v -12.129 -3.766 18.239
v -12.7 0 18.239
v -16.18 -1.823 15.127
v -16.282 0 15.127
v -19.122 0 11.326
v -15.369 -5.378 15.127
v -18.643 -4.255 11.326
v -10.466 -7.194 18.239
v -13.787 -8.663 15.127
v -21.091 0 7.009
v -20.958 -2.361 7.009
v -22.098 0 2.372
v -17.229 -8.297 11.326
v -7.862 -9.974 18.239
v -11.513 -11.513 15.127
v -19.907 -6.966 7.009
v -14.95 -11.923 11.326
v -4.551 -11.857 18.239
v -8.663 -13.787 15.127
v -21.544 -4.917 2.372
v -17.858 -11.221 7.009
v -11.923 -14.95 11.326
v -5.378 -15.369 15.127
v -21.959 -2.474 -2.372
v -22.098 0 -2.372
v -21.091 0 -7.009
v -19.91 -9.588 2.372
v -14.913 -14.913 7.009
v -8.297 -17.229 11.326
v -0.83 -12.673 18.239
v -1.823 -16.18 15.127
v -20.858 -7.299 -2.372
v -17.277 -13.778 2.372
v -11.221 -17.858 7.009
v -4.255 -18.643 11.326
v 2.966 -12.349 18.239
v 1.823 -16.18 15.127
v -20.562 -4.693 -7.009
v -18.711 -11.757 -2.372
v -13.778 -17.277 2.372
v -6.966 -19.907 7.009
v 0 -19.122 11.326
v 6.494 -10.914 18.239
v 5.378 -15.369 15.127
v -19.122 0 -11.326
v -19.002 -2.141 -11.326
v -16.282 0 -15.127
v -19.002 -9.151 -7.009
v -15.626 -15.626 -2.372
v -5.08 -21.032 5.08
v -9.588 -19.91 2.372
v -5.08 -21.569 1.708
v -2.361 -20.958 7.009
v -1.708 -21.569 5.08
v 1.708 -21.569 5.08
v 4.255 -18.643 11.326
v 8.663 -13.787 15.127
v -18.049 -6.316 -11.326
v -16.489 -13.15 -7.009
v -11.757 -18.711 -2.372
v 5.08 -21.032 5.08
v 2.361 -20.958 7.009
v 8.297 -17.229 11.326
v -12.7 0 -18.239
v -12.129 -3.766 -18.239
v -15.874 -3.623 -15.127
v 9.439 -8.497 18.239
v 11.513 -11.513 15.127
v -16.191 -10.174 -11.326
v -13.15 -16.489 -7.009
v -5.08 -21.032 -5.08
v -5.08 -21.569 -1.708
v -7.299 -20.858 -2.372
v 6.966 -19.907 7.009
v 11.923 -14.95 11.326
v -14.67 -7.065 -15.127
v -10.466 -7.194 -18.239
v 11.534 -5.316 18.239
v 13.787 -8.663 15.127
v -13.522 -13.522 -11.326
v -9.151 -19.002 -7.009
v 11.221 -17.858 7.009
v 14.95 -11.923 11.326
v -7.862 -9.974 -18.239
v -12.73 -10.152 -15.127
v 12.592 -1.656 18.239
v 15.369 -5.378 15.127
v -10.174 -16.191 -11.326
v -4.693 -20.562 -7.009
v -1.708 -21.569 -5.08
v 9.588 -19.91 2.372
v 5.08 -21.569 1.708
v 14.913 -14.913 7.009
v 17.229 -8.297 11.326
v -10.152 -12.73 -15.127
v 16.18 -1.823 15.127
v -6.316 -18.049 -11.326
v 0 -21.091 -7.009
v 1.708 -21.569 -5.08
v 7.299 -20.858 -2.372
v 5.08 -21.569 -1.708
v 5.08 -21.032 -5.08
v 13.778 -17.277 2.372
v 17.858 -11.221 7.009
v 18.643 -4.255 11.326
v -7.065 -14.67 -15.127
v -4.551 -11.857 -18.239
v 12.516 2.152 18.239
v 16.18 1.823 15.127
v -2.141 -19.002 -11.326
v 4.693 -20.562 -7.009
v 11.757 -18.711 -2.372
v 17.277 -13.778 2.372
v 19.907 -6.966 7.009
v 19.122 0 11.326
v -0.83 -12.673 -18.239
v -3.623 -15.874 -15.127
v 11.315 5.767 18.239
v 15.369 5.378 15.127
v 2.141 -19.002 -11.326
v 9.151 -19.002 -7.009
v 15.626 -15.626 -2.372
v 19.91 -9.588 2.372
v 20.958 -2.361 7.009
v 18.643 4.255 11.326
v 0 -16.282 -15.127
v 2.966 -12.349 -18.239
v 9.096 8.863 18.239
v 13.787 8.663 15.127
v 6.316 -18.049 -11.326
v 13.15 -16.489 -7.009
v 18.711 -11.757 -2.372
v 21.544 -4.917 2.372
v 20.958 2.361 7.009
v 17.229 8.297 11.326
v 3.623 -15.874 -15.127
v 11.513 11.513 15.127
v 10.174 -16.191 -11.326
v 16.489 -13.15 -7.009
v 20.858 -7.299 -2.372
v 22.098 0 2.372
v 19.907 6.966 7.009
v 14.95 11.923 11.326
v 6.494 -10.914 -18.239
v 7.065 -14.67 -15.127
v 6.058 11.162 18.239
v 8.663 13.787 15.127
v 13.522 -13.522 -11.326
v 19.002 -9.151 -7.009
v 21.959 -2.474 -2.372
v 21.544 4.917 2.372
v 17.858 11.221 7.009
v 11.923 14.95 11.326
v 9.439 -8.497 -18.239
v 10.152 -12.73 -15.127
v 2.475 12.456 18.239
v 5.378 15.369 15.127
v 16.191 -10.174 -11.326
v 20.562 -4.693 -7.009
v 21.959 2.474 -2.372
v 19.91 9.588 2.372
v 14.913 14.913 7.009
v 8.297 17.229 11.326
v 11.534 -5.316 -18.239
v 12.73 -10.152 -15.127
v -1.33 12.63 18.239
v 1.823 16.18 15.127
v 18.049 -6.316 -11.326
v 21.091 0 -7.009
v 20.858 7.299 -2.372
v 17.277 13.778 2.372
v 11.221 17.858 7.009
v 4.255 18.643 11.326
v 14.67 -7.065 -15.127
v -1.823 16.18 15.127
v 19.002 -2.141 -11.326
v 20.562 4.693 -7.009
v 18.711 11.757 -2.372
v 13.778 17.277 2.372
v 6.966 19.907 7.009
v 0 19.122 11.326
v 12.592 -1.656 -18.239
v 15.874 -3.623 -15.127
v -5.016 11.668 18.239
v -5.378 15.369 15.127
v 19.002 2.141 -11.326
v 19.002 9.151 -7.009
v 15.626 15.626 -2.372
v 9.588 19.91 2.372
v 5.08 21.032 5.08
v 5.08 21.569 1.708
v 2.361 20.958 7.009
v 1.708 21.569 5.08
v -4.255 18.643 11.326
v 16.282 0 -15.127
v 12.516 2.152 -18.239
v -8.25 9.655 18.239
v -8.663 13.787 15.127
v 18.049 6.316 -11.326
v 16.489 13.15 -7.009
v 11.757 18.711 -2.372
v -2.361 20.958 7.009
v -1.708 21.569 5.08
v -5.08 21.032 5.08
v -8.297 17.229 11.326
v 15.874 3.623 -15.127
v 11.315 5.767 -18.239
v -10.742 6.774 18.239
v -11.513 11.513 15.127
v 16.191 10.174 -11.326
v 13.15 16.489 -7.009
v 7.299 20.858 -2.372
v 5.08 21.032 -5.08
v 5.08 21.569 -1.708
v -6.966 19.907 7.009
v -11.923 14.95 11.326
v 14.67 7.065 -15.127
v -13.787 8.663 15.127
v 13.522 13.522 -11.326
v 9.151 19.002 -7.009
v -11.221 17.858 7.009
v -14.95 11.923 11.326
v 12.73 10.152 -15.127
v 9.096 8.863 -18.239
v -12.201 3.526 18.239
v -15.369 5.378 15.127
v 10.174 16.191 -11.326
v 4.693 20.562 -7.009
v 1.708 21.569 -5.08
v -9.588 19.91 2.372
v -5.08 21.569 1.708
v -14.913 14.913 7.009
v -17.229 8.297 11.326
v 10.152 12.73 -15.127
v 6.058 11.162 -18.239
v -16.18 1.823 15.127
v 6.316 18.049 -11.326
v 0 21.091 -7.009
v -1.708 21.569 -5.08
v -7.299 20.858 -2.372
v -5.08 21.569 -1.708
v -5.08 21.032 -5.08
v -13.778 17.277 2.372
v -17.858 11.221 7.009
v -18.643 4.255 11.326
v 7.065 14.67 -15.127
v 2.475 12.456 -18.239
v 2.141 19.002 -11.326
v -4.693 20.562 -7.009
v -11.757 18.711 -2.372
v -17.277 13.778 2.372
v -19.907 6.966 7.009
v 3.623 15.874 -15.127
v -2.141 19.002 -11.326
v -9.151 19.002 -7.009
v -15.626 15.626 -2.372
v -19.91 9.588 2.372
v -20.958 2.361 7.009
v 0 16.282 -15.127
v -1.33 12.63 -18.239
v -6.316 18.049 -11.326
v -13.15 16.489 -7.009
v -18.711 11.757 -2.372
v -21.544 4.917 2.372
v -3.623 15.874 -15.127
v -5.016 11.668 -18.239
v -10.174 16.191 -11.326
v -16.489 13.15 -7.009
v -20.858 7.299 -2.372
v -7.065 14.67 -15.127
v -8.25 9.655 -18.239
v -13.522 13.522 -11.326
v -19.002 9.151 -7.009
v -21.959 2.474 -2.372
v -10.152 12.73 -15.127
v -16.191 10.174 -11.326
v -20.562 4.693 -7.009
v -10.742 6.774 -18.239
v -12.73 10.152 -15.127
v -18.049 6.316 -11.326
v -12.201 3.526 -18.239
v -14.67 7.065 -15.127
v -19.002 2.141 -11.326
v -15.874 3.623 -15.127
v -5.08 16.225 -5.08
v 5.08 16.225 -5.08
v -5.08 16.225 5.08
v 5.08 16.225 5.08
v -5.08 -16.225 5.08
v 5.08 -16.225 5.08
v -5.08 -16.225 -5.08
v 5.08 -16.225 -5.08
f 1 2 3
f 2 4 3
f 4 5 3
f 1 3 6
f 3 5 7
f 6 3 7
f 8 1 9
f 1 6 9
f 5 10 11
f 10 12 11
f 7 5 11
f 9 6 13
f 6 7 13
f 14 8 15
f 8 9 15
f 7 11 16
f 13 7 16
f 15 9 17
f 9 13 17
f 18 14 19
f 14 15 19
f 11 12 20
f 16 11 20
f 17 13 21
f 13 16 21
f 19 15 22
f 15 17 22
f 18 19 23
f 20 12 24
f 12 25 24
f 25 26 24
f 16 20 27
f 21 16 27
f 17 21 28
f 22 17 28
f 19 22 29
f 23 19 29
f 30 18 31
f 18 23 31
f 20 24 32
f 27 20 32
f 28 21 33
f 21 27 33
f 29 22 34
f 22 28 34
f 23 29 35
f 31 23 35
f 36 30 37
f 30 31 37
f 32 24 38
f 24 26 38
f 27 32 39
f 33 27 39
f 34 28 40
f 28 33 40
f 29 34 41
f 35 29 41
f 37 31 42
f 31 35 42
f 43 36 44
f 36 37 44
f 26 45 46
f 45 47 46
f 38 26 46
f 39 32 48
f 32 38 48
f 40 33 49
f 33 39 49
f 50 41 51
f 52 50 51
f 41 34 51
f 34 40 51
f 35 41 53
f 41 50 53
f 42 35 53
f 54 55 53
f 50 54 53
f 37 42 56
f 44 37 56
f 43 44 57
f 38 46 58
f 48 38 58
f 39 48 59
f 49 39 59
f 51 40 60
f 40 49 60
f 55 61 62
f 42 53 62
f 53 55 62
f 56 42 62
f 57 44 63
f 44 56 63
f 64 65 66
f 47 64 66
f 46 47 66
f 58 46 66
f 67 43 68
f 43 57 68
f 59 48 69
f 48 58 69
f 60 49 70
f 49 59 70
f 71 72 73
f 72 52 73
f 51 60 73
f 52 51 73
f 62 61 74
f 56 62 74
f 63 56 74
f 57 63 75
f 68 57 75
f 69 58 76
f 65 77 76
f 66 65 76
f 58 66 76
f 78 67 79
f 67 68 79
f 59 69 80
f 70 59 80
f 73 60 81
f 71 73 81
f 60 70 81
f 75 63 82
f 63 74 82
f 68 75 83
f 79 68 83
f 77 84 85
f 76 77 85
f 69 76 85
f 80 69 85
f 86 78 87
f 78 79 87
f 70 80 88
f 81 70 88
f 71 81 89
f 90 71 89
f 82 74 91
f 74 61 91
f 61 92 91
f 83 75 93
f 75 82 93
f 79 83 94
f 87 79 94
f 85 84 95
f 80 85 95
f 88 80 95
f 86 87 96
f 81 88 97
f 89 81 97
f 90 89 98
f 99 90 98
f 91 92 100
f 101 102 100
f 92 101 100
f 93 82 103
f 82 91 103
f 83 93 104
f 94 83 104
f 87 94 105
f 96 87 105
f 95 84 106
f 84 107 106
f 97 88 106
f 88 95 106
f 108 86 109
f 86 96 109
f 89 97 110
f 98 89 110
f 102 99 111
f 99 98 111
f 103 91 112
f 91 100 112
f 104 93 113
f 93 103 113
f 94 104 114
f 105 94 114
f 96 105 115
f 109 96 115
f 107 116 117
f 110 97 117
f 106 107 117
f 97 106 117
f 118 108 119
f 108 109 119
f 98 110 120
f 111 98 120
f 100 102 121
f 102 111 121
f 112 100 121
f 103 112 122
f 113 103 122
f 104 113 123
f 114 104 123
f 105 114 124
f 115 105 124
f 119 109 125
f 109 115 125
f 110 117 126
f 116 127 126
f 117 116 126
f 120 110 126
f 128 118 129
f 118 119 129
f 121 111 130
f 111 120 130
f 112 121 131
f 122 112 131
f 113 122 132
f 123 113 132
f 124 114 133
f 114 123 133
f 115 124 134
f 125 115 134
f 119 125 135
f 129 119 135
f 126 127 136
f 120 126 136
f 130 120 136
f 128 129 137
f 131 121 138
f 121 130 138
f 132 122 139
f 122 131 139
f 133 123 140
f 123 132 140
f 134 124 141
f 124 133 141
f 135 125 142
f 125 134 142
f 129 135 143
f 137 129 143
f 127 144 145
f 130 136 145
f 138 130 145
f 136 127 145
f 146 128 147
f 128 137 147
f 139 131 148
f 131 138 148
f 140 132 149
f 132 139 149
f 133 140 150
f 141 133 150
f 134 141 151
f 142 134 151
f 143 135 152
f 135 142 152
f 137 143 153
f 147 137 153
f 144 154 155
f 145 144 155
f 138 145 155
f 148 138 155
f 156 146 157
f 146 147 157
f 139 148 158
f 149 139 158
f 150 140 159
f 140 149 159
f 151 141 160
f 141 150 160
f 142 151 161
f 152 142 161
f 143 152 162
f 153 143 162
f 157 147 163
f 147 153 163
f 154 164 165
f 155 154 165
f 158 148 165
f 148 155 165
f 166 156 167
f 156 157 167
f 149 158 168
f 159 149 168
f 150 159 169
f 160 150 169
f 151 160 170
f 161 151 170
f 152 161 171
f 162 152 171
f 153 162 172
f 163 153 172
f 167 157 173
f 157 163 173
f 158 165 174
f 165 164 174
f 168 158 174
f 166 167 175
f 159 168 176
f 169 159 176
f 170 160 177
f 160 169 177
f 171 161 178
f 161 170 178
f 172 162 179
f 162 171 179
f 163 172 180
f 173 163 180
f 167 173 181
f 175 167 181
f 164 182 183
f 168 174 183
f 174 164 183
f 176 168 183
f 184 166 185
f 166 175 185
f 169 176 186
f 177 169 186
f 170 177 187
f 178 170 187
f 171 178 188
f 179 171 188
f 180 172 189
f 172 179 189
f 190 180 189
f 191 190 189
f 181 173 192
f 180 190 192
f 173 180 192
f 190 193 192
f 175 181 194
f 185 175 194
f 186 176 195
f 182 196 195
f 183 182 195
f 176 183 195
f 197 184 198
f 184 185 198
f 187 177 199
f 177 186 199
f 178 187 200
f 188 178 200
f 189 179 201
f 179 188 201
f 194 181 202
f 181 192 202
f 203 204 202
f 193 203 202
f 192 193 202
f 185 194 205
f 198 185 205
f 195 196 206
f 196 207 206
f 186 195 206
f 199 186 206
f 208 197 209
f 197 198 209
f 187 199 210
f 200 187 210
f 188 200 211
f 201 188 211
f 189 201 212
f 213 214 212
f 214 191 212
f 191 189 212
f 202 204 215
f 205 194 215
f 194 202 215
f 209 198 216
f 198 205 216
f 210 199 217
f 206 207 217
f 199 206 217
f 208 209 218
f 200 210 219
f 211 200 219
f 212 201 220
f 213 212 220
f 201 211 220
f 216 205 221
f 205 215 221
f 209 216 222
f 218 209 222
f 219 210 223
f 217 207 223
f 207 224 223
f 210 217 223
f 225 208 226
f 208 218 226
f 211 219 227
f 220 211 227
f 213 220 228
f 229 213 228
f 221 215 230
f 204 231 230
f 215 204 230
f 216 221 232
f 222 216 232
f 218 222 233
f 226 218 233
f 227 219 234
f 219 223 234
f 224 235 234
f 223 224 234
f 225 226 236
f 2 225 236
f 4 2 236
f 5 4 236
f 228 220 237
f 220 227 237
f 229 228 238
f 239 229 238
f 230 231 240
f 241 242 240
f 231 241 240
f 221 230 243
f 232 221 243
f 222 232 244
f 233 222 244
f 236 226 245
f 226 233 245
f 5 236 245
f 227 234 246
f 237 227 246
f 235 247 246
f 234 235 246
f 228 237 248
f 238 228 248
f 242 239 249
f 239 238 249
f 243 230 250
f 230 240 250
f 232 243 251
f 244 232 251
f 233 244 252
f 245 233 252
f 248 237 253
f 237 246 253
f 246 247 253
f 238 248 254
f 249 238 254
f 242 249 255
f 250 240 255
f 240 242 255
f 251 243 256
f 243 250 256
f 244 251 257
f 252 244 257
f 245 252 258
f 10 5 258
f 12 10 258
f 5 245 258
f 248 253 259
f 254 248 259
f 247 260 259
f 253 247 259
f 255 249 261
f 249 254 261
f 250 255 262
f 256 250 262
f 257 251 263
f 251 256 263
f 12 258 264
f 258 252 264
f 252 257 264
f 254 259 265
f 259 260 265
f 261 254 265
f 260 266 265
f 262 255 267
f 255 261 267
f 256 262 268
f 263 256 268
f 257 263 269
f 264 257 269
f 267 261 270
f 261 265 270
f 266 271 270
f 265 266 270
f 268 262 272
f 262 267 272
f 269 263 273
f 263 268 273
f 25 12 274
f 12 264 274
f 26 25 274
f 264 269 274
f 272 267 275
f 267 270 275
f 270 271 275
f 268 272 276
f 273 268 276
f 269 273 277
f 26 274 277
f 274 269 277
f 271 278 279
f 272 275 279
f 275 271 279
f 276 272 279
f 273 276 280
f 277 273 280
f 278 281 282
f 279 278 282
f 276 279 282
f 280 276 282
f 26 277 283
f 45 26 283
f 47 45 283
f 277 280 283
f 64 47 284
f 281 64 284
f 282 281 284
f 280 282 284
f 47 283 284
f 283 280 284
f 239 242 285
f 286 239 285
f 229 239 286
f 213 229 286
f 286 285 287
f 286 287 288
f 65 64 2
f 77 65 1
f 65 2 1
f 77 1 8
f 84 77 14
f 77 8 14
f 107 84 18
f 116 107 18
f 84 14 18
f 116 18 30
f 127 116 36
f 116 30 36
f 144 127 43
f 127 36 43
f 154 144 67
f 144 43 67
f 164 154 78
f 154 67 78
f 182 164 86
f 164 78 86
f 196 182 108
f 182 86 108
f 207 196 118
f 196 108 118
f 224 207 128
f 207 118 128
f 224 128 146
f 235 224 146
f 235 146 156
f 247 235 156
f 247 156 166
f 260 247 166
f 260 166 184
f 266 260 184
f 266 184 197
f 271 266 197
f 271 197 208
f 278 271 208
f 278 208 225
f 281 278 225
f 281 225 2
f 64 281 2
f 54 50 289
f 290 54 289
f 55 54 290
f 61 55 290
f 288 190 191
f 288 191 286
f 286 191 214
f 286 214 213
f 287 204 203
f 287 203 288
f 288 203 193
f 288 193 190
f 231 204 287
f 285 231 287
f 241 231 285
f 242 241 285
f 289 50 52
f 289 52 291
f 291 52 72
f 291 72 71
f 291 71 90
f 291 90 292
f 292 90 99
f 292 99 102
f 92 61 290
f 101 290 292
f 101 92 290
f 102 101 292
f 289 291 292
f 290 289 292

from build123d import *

# Parameters (mm, degrees)
SKETCH5_R          = 12.7
CUT_EXTRUDE2_DEPTH = 49.864135621
SKETCH6_W          = 10.16
SKETCH6_H          = 10.16
CUT_EXTRUDE3_DEPTH = 6


with BuildPart() as part:
    # Sketch4 → Revolve4 (revolve)
    with BuildSketch(Plane(origin=(0, 0, 0), x_dir=(1, 0, 0), z_dir=(0, 1, 0))):
        with BuildLine():
            Line((-12, 18.706967285), (0, 18.706967285))
            Line((0, 18.706967285), (0, -18.706967285))
            Line((0, -18.706967285), (-12, -18.706967285))
            ThreePointArc((-12, -18.706967285), (-22.225, 0), (-12, 18.706967285))
        make_face()
    revolve(axis=Axis((0, 0, -17.487077089), (0, 0, 1)))

    # Sketch5 → Cut-Extrude2 (cut, through all)
    with BuildSketch(Plane.XY.offset(18.706967285)):
        with Locations(Location((0, 0, 0), (0, 0, 180))):
            Circle(SKETCH5_R)
    extrude(amount=-CUT_EXTRUDE2_DEPTH, mode=Mode.SUBTRACT)

    # Sketch6 → Cut-Extrude3 (cut)
    with BuildSketch(Plane(origin=(0, 22.225, 0), x_dir=(1, 0, 0), z_dir=(0, 1, 0))):
        Rectangle(SKETCH6_W, SKETCH6_H)
    cut_extrude3 = extrude(amount=-CUT_EXTRUDE3_DEPTH, mode=Mode.SUBTRACT)

    # Mirror1: Cut-Extrude3 across plane
    add(cut_extrude3.mirror(Plane.ZX), mode=Mode.SUBTRACT)


solid = part.part
